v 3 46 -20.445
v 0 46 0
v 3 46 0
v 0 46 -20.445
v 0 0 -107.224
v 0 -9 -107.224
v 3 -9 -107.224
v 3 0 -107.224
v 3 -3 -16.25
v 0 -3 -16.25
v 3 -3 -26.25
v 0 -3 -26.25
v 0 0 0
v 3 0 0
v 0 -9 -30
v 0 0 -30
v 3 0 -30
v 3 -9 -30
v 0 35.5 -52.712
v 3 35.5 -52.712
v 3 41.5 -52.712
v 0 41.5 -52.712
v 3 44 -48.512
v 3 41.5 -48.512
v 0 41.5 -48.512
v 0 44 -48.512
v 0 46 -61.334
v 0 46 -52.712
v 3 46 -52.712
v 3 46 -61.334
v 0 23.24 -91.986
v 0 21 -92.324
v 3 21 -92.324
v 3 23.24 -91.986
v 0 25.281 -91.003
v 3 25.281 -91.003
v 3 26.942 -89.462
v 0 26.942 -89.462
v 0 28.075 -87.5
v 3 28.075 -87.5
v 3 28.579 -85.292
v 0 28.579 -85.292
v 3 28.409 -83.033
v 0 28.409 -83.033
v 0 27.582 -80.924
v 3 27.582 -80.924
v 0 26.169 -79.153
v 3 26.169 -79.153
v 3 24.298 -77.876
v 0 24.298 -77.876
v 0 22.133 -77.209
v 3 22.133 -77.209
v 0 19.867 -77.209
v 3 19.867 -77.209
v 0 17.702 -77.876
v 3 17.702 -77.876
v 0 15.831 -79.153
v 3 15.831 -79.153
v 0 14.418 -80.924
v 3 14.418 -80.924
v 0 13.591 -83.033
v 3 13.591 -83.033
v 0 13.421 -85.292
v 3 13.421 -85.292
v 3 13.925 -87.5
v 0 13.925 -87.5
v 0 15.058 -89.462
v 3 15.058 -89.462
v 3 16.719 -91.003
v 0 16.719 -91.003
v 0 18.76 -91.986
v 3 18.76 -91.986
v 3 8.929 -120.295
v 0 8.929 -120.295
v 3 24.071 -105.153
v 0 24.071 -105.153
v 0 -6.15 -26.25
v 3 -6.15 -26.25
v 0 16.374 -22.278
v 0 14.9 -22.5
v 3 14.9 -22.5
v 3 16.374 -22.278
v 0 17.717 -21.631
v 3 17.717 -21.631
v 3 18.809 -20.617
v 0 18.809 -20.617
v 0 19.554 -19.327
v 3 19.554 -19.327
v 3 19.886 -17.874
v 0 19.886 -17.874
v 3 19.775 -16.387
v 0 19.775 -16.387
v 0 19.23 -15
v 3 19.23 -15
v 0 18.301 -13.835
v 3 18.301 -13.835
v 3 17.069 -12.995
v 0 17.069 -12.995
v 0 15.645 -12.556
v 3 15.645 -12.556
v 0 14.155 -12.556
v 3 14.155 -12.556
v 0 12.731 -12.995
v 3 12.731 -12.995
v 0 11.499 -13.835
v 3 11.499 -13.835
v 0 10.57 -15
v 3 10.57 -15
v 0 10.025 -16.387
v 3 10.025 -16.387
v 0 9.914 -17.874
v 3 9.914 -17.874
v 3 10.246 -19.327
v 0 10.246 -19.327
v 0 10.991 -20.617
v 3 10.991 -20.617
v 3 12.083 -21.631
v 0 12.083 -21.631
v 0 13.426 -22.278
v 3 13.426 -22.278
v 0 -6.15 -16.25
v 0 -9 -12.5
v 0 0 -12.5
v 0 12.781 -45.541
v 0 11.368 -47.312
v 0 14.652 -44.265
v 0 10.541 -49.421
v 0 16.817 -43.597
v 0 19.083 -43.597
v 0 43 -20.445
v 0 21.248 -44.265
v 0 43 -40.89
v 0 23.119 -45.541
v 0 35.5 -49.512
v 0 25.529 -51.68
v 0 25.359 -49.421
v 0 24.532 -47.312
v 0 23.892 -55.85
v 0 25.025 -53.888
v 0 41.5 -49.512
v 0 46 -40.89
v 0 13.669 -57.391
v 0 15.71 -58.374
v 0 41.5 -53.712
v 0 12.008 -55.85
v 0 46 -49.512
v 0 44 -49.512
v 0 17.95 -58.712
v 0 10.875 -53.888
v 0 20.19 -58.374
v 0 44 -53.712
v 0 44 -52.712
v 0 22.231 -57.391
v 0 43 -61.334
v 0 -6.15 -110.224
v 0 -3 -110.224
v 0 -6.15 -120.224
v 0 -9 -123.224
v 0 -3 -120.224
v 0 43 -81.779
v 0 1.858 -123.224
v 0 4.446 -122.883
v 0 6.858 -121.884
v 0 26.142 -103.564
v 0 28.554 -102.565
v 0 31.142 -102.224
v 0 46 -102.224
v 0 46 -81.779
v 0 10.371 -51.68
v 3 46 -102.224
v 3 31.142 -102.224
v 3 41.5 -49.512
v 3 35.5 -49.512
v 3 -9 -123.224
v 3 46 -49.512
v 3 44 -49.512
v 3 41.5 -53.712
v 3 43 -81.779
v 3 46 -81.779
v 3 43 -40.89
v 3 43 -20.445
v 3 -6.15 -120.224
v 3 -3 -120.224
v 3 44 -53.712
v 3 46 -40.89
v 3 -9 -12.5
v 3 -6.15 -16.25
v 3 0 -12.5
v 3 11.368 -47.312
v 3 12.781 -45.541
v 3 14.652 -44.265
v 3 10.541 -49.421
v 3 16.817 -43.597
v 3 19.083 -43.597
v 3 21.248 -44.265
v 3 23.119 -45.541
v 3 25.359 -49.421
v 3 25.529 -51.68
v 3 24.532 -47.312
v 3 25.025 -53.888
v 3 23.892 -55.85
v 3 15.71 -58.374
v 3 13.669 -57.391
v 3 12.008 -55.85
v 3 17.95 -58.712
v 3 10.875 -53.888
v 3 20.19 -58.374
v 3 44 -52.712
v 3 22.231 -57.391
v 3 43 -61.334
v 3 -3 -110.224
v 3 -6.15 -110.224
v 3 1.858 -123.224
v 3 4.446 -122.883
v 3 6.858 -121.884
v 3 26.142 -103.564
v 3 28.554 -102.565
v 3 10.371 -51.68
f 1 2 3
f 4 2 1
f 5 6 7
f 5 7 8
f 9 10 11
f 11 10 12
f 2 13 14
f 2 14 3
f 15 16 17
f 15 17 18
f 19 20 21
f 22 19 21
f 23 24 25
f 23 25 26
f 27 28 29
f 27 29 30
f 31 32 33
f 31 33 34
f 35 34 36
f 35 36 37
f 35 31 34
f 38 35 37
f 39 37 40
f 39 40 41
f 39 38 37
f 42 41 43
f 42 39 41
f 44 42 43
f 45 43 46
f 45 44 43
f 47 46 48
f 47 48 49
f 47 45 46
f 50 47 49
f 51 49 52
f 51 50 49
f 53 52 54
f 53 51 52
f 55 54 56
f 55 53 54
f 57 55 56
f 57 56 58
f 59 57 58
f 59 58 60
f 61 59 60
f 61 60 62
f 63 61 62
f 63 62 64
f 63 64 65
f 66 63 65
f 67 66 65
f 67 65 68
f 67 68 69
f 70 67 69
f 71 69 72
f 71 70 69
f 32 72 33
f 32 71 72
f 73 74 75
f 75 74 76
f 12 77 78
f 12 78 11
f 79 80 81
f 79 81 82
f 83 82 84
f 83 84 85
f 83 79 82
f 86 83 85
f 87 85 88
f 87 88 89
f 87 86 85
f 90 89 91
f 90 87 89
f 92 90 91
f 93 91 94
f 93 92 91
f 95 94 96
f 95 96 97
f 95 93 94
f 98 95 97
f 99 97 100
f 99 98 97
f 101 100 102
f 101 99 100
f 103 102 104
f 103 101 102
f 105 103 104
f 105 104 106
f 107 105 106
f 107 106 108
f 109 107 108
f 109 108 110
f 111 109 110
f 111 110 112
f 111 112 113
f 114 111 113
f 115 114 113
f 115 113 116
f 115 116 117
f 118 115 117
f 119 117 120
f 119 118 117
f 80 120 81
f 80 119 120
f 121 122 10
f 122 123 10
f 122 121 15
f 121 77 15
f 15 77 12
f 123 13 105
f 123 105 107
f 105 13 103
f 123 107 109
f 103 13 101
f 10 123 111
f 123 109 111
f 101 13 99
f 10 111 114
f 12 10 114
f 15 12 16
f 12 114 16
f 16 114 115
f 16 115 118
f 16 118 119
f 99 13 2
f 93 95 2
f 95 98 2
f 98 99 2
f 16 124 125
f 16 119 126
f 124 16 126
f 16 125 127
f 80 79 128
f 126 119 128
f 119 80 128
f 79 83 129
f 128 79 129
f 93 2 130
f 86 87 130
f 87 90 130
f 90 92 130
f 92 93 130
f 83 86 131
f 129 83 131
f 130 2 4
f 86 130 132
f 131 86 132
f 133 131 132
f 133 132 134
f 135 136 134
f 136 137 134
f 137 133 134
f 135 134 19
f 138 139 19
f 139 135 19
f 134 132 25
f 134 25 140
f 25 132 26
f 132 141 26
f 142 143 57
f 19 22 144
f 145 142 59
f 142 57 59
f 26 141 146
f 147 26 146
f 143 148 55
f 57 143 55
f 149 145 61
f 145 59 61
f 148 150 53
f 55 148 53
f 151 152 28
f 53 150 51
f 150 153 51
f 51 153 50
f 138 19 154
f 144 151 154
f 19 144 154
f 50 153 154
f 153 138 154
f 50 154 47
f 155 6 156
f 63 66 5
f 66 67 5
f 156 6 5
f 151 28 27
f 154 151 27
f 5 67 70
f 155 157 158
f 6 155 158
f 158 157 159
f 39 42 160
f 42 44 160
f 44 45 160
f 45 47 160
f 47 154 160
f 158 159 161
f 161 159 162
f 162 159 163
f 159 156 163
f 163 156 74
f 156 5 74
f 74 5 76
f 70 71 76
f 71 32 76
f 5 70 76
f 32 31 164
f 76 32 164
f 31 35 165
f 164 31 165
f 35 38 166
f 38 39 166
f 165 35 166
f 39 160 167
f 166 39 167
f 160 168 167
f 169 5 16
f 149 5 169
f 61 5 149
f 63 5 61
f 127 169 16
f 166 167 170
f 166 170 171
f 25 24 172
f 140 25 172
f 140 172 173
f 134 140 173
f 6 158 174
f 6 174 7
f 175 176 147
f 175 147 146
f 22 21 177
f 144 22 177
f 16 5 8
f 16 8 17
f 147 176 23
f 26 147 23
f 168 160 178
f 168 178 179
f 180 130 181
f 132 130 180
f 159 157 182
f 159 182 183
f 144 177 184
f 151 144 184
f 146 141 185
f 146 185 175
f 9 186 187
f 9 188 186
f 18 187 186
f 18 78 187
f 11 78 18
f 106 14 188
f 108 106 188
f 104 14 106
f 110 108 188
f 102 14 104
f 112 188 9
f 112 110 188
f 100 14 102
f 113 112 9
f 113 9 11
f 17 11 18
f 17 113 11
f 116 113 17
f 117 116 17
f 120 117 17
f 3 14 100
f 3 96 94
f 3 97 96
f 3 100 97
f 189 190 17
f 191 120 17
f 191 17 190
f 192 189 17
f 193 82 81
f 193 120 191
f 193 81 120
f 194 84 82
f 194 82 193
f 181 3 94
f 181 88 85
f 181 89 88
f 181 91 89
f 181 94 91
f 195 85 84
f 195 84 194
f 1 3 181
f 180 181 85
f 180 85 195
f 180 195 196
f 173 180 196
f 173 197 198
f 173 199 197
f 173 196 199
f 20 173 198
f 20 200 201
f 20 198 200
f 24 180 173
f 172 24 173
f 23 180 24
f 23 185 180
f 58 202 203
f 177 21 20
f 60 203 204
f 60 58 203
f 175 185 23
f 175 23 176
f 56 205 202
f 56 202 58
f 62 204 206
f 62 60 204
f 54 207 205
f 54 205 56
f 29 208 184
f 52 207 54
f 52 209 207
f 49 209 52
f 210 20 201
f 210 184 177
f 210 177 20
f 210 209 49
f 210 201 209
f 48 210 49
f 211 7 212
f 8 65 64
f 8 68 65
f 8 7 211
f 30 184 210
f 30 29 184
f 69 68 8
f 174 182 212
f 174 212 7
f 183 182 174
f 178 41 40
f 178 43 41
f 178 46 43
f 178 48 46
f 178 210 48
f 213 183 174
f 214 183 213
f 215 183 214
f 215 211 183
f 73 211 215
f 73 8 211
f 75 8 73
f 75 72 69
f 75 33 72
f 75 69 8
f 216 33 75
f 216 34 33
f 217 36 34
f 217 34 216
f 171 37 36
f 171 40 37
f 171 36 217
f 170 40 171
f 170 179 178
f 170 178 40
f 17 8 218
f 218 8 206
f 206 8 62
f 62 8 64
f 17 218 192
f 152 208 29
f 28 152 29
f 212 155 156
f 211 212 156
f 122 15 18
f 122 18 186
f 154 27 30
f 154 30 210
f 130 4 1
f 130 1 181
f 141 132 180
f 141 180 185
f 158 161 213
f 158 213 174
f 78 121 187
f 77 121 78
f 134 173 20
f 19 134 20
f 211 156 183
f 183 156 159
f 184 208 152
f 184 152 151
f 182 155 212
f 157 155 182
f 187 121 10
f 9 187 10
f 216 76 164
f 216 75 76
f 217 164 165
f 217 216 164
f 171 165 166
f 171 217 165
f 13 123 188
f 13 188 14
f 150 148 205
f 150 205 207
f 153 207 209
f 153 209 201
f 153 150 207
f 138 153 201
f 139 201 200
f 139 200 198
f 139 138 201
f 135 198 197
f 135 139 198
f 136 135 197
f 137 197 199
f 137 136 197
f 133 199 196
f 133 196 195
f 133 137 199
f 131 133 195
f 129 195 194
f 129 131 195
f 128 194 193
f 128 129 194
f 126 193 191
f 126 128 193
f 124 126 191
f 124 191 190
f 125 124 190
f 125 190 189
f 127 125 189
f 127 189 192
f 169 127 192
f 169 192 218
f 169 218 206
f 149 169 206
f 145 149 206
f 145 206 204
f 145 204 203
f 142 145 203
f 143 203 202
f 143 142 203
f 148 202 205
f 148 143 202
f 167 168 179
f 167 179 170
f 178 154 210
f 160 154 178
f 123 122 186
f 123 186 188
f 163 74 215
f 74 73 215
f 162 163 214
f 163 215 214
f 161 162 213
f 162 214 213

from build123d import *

# Parameters (mm, degrees)
SKETCH1_R               = 7.6
SKETCH1_R_2             = 5
SKETCH1_W               = 10
SKETCH1_H               = 3.15
BOSS_EXTRUDE1_DEPTH     = 3
FILLET1_R               = 10
SKETCH2_W               = 3.2
SKETCH2_H               = 6
SKETCH2_H_2             = 2.5
SKETCH2_W_2             = 1
SKETCH2_H_3             = 2
CUT_EXTRUDE1_DEPTH      = 1
CUT_EXTRUDE1_DEPTH_BACK = 4


with BuildPart() as part:
    # Sketch1 → Boss-Extrude1 (new body)
    with BuildSketch(Plane(origin=(0, 0, 0), x_dir=(0, 0, -1), z_dir=(1, 0, 0))):
        Polygon((102.223805307, 6), (123.223805307, 6), (102.223805307, 27), align=None)
        Polygon((102.223805307, 6), (123.223805307, 6), (123.223805307, -9), (107.223805307, -9), (107.223805307, 0), (30, 0), (30, -9), (12.5, -9), (12.5, 0), (0, 0), (0, 46), (20.444761061, 46), (20.444761061, 43), (40.889522123, 43), (40.889522123, 46), (61.334283184, 46), (61.334283184, 43), (81.779044246, 43), (81.779044246, 46), (102.223805307, 46), align=None)
        with Locations((84.723805307, 21)):
            Circle(SKETCH1_R, mode=Mode.SUBTRACT)
        with Locations((51.111902654, 17.95)):
            Circle(SKETCH1_R, mode=Mode.SUBTRACT)
        with Locations((17.5, 14.9)):
            Circle(SKETCH1_R_2, mode=Mode.SUBTRACT)
        with Locations((115.223805307, -4.575)):
            Rectangle(SKETCH1_W, SKETCH1_H, mode=Mode.SUBTRACT)
        with Locations((21.25, -4.575)):
            Rectangle(SKETCH1_W, SKETCH1_H, mode=Mode.SUBTRACT)
    extrude(amount=BOSS_EXTRUDE1_DEPTH)

    # Fillet1
    fillet1_edges = [part.edges().sort_by_distance(p)[0] for p in [
        (1.5, 6, -123.223805307),
        (1.5, 27, -102.223805307),
    ]]
    fillet(fillet1_edges, radius=FILLET1_R)

    # Sketch2 → Cut-Extrude1 (cut, two sides)
    with BuildSketch(Plane(origin=(3, 0, 0), x_dir=(0, 0, -1), z_dir=(1, 0, 0))) as cut_extrude1_sk:
        with Locations((51.111902654, 38.5)):
            Rectangle(SKETCH2_W, SKETCH2_H)
        with Locations((51.111902654, 42.75)):
            Rectangle(SKETCH2_W, SKETCH2_H_2)
        with Locations((49.011902654, 42.75)):
            Rectangle(SKETCH2_W_2, SKETCH2_H_2)
        with Locations((51.111902654, 45)):
            Rectangle(SKETCH2_W, SKETCH2_H_3)
        with Locations((53.211902654, 42.75)):
            Rectangle(SKETCH2_W_2, SKETCH2_H_2)
    extrude(amount=CUT_EXTRUDE1_DEPTH, mode=Mode.SUBTRACT)
    extrude(cut_extrude1_sk.sketch, amount=-CUT_EXTRUDE1_DEPTH_BACK, mode=Mode.SUBTRACT)


solid = part.part
